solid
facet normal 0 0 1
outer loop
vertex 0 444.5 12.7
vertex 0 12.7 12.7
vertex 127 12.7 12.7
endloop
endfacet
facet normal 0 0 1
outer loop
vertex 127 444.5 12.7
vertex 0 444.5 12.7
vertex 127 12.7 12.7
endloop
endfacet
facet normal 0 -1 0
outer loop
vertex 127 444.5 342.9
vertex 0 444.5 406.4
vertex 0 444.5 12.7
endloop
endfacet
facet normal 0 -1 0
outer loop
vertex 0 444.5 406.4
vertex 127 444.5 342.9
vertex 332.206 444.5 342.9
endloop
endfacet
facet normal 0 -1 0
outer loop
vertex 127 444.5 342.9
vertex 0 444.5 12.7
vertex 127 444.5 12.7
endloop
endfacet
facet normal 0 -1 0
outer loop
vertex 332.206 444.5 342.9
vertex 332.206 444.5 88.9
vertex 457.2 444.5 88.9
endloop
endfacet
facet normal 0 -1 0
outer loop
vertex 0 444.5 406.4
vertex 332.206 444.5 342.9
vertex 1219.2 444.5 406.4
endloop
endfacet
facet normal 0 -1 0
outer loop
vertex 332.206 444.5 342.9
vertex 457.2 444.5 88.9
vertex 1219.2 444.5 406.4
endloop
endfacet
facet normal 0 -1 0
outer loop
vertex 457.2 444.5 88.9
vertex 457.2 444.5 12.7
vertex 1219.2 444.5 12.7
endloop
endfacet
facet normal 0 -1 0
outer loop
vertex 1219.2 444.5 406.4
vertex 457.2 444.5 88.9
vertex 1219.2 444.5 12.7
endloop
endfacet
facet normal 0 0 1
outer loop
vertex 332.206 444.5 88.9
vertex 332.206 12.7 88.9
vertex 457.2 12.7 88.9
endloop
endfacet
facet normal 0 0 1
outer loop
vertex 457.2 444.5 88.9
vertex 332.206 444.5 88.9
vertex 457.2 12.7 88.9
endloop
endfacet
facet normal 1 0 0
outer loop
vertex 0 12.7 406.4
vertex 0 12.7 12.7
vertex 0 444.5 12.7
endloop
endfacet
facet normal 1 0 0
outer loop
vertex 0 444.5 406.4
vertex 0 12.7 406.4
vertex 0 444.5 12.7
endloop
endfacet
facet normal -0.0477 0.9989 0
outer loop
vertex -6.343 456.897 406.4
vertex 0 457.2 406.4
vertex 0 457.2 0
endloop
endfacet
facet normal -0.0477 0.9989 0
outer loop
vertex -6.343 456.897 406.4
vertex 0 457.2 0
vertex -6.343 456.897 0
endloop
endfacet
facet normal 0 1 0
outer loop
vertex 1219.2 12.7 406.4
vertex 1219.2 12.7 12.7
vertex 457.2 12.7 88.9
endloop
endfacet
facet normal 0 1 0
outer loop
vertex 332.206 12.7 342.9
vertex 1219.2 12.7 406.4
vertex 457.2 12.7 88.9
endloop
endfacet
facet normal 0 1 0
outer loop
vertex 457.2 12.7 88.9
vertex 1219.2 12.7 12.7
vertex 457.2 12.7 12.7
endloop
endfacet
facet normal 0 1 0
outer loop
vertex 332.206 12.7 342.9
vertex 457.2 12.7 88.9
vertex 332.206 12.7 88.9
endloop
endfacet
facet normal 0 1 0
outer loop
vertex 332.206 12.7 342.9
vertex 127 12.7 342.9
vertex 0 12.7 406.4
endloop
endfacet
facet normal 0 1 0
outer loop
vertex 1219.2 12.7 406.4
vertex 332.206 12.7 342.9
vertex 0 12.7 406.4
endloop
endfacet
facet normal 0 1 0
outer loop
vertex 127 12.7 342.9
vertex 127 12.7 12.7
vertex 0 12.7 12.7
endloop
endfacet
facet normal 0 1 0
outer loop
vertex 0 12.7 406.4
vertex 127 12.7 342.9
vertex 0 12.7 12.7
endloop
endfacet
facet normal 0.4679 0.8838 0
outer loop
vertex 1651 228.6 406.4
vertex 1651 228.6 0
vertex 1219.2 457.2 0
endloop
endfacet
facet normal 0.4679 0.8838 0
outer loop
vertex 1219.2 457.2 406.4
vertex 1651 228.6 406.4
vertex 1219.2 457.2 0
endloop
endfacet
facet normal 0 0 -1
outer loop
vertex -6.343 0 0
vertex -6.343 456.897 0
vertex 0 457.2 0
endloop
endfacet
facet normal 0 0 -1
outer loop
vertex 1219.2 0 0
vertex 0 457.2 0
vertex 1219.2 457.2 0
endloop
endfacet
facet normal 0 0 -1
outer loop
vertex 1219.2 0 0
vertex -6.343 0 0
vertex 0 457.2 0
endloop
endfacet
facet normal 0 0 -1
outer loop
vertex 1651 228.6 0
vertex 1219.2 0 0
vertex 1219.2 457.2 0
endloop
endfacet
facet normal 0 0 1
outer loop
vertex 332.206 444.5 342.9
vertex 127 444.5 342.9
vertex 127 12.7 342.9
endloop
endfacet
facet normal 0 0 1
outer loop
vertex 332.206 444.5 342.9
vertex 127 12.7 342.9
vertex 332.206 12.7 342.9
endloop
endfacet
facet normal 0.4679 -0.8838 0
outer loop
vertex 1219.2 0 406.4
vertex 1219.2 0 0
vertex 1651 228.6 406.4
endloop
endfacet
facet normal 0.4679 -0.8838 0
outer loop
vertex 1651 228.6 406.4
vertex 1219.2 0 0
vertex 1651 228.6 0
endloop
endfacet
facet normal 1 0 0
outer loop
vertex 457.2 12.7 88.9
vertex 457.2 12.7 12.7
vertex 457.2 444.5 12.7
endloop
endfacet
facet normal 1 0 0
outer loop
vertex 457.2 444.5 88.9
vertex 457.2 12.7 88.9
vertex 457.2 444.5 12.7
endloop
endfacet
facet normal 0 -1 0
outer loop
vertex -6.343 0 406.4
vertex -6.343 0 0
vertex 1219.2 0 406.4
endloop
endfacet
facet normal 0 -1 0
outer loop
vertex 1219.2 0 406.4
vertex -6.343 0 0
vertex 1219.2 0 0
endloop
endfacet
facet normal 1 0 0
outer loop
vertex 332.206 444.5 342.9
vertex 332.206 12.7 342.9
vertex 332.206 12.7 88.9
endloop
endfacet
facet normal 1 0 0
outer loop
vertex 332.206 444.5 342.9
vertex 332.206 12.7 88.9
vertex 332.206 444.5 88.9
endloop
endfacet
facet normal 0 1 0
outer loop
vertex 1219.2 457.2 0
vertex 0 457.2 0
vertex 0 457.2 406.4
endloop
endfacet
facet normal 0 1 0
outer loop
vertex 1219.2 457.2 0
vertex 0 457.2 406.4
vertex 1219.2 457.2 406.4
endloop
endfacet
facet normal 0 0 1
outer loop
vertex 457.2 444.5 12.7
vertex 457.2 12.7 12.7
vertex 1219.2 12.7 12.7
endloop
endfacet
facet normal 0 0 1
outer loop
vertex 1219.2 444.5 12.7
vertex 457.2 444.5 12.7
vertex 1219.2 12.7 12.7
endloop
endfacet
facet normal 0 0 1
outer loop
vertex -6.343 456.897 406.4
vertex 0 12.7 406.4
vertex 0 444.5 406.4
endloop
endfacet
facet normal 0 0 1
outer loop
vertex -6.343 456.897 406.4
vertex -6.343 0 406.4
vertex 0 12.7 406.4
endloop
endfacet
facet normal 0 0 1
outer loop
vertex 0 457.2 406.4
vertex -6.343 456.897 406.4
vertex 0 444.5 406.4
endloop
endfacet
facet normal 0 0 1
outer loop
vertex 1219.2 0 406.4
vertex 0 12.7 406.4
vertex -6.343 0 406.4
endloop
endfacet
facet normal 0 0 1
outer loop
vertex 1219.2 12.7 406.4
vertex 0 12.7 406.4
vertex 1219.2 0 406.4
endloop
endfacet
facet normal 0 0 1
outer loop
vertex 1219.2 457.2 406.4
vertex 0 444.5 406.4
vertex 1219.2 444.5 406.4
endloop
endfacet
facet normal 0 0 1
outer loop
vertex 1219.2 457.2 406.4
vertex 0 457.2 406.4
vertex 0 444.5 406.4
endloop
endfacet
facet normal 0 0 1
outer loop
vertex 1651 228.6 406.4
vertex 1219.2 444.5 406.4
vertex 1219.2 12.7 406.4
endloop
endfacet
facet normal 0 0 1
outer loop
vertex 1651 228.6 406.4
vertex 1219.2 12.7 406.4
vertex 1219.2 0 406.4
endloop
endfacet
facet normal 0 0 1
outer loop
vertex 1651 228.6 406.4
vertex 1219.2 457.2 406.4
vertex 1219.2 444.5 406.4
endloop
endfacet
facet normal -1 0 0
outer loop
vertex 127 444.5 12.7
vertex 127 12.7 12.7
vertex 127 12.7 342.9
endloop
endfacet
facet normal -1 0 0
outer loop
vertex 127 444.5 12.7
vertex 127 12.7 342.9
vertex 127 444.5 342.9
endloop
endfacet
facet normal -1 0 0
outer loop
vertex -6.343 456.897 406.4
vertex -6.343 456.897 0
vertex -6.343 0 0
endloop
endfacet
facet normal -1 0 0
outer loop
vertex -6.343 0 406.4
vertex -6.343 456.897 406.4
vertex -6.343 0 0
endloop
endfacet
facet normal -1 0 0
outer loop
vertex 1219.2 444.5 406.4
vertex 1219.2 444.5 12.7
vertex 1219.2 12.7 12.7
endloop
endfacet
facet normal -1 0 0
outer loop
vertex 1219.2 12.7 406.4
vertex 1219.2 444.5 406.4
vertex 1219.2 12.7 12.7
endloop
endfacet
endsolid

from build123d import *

# Parameters (mm, degrees)
F0_W     = 1219.2
F0_H     = 12.7
F1_DEPTH = 406.4
F2_W     = 1219.2
F2_H     = 431.8
F3_DEPTH = 12.7
F4_W     = 203.2
F4_H     = 431.8
F4_W_2   = 127
F5_DEPTH = 330.2
F6_W     = 124.9939593792
F6_H     = 431.8
F7_DEPTH = 254


with BuildPart() as f1:
    # F0 (on Top) → F1 (new body)
    with BuildSketch(Plane.XY):
        with Locations((609.6, 6.35)):
            Rectangle(F0_W, F0_H)
        Polygon((-6.3427571863, 0), (0, 0), (0, 12.7), (0, 444.5), (0, 457.2), (-6.3427571863, 456.896798293), align=None)
        Polygon((1219.2, 12.7), (1219.2, 0), (1243.1888888889, 12.7), align=None)
        Polygon((1219.2, 12.7), (1243.1888888889, 12.7), (1651, 228.6), (1243.1888888889, 444.5), (1219.2, 444.5), align=None)
        with Locations((609.6, 450.85)):
            Rectangle(F0_W, F0_H)
        Polygon((1219.2, 457.2), (1219.2, 444.5), (1243.1888888889, 444.5), align=None)
    extrude(amount=F1_DEPTH)

    # F2 (on face) → F3 (join)
    with BuildSketch(Plane(origin=(0, 0, 0), x_dir=(1, 0, 0), z_dir=(0, 0, -1))):
        with Locations((609.6, -228.6)):
            Rectangle(F2_W, F2_H)
    extrude(amount=-F3_DEPTH)

    # F4 (on face) → F5 (join)
    with BuildSketch(Plane.XY.offset(12.7)):
        with Locations((228.6, 228.6)):
            Rectangle(F4_W, F4_H)
        with Locations((393.7, 228.6)):
            Rectangle(F4_W_2, F4_H)
    extrude(amount=F5_DEPTH)

    # F6 (on face) → F7 (cut)
    with BuildSketch(Plane.XY.offset(342.9)):
        with Locations((394.7030203104, 228.6)):
            Rectangle(F6_W, F6_H)
    extrude(amount=-F7_DEPTH, mode=Mode.SUBTRACT)


solid = f1.part
